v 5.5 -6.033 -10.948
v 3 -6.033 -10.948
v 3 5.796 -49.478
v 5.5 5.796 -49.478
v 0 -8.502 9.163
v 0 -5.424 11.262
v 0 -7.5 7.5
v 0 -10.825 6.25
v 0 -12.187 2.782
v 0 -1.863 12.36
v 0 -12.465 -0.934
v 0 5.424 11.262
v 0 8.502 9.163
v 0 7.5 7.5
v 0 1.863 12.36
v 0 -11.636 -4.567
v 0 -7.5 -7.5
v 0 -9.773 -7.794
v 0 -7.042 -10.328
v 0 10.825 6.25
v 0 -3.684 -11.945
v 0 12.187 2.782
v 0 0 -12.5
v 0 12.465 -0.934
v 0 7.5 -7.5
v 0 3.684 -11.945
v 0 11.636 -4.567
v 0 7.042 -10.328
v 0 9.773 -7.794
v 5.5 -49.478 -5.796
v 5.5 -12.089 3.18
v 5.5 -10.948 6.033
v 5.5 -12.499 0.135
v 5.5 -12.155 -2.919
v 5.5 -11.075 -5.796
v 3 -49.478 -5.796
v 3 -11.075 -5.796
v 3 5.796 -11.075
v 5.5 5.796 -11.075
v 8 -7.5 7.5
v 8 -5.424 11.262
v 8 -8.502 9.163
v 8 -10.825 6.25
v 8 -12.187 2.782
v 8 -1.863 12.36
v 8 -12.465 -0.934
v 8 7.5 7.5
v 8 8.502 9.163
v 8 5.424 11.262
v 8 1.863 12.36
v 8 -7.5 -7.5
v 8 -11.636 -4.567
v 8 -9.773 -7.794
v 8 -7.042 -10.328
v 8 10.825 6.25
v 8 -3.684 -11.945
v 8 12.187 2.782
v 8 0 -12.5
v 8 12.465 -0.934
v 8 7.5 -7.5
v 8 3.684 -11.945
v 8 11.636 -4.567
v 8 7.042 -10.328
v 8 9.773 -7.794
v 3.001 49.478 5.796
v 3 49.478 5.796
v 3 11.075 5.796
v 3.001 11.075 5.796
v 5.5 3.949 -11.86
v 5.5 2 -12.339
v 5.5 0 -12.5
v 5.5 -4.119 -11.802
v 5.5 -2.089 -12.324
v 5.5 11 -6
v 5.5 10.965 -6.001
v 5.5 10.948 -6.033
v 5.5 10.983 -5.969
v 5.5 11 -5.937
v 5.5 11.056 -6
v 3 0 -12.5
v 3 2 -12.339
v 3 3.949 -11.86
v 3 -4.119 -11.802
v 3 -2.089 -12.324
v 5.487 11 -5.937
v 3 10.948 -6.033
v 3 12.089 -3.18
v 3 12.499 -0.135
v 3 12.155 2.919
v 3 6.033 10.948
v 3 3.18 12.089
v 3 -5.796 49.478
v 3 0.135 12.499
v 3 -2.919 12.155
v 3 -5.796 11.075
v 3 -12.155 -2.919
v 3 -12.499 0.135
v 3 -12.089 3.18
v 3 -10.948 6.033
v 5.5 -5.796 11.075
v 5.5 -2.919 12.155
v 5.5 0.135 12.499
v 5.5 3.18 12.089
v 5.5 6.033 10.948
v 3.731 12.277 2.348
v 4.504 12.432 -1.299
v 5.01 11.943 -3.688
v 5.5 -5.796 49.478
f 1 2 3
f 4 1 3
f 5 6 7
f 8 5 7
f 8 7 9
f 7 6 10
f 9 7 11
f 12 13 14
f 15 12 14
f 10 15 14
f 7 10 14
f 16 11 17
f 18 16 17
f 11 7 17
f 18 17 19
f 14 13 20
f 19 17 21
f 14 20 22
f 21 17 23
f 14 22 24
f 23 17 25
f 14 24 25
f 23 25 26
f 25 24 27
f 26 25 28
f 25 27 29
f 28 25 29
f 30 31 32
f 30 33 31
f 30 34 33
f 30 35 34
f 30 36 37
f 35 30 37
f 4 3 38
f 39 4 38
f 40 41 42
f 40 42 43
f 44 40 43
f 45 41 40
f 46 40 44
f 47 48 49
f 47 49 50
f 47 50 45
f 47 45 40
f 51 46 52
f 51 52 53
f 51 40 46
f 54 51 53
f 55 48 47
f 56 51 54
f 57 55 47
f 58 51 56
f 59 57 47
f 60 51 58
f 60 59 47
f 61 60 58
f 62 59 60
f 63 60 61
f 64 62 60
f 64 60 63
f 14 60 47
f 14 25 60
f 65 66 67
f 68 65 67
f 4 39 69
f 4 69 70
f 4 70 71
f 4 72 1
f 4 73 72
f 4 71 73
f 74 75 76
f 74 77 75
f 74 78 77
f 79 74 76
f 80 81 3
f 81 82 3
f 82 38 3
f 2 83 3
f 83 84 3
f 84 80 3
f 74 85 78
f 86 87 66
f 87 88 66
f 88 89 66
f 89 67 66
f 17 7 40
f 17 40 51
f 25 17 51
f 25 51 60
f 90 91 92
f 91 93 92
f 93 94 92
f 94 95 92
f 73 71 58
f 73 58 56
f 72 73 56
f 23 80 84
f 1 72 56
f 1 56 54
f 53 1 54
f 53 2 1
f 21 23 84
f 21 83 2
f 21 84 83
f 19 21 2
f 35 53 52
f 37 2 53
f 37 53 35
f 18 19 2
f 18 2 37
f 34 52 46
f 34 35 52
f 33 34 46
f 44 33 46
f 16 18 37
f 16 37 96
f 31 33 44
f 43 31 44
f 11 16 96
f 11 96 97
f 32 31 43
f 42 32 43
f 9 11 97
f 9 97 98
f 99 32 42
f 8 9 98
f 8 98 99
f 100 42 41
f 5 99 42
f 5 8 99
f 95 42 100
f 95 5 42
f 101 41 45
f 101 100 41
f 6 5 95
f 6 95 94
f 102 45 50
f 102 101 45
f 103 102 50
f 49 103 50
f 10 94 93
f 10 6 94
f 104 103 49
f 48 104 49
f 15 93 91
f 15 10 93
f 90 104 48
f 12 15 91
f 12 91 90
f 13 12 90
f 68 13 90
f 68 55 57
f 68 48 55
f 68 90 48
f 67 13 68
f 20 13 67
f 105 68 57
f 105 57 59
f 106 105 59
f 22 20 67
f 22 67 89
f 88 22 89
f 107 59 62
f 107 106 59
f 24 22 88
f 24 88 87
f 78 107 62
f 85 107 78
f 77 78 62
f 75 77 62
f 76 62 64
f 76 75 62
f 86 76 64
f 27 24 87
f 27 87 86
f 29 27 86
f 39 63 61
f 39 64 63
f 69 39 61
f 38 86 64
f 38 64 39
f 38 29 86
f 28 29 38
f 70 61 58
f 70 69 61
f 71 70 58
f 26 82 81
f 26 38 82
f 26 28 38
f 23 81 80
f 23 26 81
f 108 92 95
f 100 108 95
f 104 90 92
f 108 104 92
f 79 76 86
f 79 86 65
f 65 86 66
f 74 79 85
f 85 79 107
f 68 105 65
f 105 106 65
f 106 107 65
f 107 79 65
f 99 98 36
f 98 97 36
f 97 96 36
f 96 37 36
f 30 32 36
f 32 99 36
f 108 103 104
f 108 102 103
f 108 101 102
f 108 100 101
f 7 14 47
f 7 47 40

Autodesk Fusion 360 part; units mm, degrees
sketch "Sketch1" plane through (0, 0, 0) normal (1, 0, 0) x (0, 0, -1)
  circle A0 centre (0, 0) radius 12.5
  line L0 (7.5, 7.5) -> (-7.5, 7.5)
  line L1 (-7.5, 7.5) -> (-7.5, -7.5)
  line L2 (-7.5, -7.5) -> (7.5, -7.5)
  line L3 (7.5, -7.5) -> (7.5, 7.5)
  line L4 (7.5, 7.5) -> (-7.5, -7.5) construction
  line L5 (-7.5, 7.5) -> (7.5, -7.5) construction
  dimension "d1" = 25
  dimension "d2" = 15
  dimension "d3" = 15
extrude "Extrude1" add sketch "Sketch1" along normal blind 8
sketch "Sketch2" plane through (0, 0, 0) normal (0, 1, 0) x (1, 0, 0)
sketch "Sketch3" plane through (8, 0, 0) normal (1, 0, 0) x (0, 0, -1)
  line L0 (7.5, 7.5) -> (7.5, -7.5)
  line L1 (7.5, -7.5) -> (-7.5, -7.5)
  line L2 (-7.5, -7.5) -> (-7.5, 7.5)
  line L3 (-7.5, 7.5) -> (7.5, 7.5)
  circle A0 centre (0, 0) radius 12.5
  line L4 (-5.7956, 9.4779) -> (6.4844, 9.4779)
  line L5 (6.4844, 9.4779) -> (-5.7956, 49.4779)
  line L6 (-5.7956, 49.4779) -> (-5.7956, 9.4779)
  dimension "d14" = 40
extrude "Extrude2" add sketch "Sketch3" along normal blind 2.5 from surface at -5 contours A0 L5 L6
sketch "Sketch4" plane through (0, 0, 0) normal (0, 1, 0) x (1, 0, 0)
  line L0 (2.9867, -5.8624) -> (5.5, -5.8624)
  line L1 (5.5, -5.8624) -> (5.5, 6)
  line L2 (5.5, 6) -> (2.9867, -5.8624)
extrude "Extrude3" cut sketch "Sketch4" against normal blind 39 from surface at 50
pattern_circular "C-Pattern1" count 4 over 360 about axis through (1.75, 0, 0) along (1, 0, 0) of "Extrude3", "Extrude2"
sketch "Sketch5" plane through (0, 0, 0) normal (0, 1, 0) x (-1, 0, 0)
sketch "Sketch6" plane through (8, 0, 0) normal (1, 0, 0) x (0, 0, -1)
  line L0 (7.5, 7.5) -> (7.5, -7.5)
  line L1 (7.5, -7.5) -> (-7.5, -7.5)
  line L2 (-7.5, -7.5) -> (-7.5, 7.5)
  line L3 (-7.5, 7.5) -> (7.5, 7.5)
  circle A0 centre (0, 0) radius 12.5
  circle A1 centre (0, 0) radius 12.5
  line L4 (7.5, 7.5) -> (-7.5, 7.5)
  line L5 (-7.5, 7.5) -> (-7.5, -7.5)
  line L6 (-7.5, -7.5) -> (7.5, -7.5)
  line L7 (7.5, -7.5) -> (7.5, 7.5)
  line L8 (7.5, 7.5) -> (-7.5, -7.5) construction
  line L9 (-7.5, 7.5) -> (7.5, -7.5) construction
extrude "Extrude4" add sketch "Sketch6" against normal blind 8
